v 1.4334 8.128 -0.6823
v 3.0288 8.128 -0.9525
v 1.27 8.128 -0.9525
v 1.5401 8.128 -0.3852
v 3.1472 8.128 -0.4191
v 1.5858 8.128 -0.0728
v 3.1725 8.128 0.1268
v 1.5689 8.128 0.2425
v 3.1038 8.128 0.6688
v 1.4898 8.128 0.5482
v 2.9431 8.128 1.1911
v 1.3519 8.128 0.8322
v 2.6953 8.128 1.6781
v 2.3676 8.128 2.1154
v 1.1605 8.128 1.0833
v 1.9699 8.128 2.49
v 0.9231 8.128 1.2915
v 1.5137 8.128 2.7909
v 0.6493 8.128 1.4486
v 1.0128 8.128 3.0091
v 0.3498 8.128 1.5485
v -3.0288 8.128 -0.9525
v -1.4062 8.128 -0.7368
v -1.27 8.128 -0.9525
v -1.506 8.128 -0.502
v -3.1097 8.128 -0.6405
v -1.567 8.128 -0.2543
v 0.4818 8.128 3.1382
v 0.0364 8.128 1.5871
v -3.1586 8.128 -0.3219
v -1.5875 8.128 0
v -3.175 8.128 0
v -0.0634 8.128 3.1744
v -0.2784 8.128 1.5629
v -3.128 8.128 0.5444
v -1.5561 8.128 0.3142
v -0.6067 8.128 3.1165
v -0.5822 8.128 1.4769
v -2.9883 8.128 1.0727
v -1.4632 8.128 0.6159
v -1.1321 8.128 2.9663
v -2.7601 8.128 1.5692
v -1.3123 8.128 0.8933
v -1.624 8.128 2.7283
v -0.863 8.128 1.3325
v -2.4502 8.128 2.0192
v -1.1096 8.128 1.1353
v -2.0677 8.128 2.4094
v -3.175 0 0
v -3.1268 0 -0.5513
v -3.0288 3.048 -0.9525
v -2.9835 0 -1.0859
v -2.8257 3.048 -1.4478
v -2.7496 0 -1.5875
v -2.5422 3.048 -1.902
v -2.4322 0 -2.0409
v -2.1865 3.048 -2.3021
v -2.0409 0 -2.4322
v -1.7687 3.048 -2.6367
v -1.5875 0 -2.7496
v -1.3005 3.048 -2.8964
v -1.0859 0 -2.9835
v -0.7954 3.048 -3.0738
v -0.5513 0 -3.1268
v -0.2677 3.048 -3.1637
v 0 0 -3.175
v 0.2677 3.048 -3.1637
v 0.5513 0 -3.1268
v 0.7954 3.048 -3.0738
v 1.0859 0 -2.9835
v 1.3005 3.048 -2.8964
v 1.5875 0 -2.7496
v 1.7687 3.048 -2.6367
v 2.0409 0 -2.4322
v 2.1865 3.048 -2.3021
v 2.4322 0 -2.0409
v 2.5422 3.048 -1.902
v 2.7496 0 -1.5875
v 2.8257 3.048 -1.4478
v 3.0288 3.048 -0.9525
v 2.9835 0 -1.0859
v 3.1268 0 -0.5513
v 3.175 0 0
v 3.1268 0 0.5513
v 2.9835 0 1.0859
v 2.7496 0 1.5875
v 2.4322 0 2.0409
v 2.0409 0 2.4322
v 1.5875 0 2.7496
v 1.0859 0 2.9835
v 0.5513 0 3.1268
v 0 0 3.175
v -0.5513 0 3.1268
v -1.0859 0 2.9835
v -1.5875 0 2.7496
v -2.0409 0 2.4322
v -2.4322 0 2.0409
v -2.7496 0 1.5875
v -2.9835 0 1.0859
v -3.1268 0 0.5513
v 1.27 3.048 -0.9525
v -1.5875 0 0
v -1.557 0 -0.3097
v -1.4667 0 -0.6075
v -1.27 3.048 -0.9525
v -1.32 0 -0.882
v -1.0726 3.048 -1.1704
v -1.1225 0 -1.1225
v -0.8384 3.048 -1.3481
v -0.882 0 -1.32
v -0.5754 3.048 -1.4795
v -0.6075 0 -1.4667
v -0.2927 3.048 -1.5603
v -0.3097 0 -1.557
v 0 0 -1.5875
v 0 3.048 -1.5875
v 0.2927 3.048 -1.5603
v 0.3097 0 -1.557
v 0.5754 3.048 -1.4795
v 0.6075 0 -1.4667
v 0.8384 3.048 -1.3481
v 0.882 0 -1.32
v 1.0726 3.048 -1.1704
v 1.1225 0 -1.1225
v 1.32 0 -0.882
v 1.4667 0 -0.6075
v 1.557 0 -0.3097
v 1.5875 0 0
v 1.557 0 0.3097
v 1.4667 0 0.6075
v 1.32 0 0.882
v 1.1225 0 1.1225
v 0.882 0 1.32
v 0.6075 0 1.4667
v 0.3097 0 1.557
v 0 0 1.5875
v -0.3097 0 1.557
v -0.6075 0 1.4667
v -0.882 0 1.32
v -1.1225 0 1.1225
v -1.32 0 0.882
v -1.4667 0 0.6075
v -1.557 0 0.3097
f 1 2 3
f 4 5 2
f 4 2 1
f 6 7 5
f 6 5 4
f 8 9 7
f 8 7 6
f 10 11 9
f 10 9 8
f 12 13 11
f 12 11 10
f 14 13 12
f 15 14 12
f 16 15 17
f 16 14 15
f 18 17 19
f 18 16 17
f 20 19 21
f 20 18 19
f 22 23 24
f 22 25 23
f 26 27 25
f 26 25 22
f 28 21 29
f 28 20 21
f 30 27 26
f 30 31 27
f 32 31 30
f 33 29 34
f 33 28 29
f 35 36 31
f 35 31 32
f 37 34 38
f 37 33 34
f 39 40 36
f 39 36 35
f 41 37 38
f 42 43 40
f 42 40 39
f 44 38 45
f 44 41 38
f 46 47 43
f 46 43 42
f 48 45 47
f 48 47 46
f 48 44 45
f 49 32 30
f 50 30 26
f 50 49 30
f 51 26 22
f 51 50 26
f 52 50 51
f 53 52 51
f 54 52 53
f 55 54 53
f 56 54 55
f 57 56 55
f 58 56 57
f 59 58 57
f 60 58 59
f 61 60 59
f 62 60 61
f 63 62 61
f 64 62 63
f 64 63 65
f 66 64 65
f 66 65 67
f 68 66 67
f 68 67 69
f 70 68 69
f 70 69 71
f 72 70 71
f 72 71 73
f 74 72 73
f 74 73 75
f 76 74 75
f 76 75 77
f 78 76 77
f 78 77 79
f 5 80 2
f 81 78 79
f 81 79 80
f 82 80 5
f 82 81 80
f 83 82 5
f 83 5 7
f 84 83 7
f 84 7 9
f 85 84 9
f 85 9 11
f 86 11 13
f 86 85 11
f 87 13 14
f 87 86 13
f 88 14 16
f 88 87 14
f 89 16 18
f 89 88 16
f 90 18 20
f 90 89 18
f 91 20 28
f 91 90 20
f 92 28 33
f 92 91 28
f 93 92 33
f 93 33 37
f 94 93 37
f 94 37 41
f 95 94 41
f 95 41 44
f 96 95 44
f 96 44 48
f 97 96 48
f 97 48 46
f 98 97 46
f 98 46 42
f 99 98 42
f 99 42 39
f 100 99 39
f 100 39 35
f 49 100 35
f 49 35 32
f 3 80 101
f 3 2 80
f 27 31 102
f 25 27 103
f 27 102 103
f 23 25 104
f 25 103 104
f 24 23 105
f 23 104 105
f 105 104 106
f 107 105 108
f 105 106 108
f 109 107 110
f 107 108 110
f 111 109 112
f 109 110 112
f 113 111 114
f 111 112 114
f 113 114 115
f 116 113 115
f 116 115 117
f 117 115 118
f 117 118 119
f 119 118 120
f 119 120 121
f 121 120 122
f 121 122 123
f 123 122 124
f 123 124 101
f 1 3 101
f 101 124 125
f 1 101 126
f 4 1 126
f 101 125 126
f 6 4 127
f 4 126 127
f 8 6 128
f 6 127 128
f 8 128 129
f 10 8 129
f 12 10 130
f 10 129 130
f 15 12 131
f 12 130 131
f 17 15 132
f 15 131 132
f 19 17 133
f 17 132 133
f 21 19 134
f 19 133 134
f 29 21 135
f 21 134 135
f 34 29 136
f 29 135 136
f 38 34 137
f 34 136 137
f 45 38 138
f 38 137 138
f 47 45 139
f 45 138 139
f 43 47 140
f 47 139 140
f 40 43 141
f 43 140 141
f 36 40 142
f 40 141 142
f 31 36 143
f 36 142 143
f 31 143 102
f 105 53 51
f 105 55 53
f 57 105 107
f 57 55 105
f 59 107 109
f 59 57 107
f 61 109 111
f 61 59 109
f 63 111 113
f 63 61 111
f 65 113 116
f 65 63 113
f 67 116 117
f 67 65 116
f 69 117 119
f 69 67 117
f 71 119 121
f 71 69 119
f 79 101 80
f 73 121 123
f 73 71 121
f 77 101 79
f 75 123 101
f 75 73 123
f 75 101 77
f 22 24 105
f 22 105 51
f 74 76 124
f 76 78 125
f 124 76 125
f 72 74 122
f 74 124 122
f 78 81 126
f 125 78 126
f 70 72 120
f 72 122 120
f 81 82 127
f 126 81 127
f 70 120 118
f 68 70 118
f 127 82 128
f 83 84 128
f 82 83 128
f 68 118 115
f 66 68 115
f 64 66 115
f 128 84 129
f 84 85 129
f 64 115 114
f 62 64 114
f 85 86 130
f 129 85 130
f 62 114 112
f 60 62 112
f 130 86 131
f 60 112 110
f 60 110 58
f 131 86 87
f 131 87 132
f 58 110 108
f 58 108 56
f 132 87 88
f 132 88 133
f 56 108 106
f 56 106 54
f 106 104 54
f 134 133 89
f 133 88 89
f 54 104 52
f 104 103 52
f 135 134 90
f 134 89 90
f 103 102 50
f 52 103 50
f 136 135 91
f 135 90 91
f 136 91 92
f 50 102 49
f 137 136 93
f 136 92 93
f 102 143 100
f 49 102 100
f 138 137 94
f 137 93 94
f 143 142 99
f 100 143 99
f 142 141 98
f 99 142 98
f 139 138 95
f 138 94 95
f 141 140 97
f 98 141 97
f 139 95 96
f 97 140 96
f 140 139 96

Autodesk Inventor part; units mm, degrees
ref_plane "YZ Plane" through (0, 0, 0) normal (1, 0, 0) x (0, 1, 0)
ref_plane "XZ Plane" through (0, 0, 0) normal (0, 1, 0) x (-1, 0, 0)
ref_plane "XY Plane" through (0, 0, 0) normal (0, 0, 1) x (1, 0, 0)
sketch "Sketch1" plane through (0, 0, 0) normal (0, 1, 0) x (-1, 0, 0)
  circle A0 centre (0, 0) radius 1.5875
  circle A1 centre (0, 0) radius 3.175
  dimension "d0" = 3.175
  dimension "d1" = 6.35
extrude "Extrusion1" add sketch "Sketch1" along normal blind 8.128
sketch "Sketch2" plane through (0, 8.128, 0) normal (0, 1, 0) x (1, 0, 0)
  line L0 (-3.175, 3.7564) -> (3.175, 3.7564)
  line L1 (3.175, 3.7564) -> (3.175, 0.9525)
  line L2 (3.175, 0.9525) -> (-3.175, 0.9525)
  line L3 (-3.175, 0.9525) -> (-3.175, 3.7564)
  point P0 (0, 0)
  dimension "d4" = 3.175
  dimension "d5" = 6.35
  dimension "d6" = 0.9525
extrude "Extrusion2" cut sketch "Sketch2" against normal blind 5.08
properties part number "ShaftCollar" material "Brass, Soft Yellow"
